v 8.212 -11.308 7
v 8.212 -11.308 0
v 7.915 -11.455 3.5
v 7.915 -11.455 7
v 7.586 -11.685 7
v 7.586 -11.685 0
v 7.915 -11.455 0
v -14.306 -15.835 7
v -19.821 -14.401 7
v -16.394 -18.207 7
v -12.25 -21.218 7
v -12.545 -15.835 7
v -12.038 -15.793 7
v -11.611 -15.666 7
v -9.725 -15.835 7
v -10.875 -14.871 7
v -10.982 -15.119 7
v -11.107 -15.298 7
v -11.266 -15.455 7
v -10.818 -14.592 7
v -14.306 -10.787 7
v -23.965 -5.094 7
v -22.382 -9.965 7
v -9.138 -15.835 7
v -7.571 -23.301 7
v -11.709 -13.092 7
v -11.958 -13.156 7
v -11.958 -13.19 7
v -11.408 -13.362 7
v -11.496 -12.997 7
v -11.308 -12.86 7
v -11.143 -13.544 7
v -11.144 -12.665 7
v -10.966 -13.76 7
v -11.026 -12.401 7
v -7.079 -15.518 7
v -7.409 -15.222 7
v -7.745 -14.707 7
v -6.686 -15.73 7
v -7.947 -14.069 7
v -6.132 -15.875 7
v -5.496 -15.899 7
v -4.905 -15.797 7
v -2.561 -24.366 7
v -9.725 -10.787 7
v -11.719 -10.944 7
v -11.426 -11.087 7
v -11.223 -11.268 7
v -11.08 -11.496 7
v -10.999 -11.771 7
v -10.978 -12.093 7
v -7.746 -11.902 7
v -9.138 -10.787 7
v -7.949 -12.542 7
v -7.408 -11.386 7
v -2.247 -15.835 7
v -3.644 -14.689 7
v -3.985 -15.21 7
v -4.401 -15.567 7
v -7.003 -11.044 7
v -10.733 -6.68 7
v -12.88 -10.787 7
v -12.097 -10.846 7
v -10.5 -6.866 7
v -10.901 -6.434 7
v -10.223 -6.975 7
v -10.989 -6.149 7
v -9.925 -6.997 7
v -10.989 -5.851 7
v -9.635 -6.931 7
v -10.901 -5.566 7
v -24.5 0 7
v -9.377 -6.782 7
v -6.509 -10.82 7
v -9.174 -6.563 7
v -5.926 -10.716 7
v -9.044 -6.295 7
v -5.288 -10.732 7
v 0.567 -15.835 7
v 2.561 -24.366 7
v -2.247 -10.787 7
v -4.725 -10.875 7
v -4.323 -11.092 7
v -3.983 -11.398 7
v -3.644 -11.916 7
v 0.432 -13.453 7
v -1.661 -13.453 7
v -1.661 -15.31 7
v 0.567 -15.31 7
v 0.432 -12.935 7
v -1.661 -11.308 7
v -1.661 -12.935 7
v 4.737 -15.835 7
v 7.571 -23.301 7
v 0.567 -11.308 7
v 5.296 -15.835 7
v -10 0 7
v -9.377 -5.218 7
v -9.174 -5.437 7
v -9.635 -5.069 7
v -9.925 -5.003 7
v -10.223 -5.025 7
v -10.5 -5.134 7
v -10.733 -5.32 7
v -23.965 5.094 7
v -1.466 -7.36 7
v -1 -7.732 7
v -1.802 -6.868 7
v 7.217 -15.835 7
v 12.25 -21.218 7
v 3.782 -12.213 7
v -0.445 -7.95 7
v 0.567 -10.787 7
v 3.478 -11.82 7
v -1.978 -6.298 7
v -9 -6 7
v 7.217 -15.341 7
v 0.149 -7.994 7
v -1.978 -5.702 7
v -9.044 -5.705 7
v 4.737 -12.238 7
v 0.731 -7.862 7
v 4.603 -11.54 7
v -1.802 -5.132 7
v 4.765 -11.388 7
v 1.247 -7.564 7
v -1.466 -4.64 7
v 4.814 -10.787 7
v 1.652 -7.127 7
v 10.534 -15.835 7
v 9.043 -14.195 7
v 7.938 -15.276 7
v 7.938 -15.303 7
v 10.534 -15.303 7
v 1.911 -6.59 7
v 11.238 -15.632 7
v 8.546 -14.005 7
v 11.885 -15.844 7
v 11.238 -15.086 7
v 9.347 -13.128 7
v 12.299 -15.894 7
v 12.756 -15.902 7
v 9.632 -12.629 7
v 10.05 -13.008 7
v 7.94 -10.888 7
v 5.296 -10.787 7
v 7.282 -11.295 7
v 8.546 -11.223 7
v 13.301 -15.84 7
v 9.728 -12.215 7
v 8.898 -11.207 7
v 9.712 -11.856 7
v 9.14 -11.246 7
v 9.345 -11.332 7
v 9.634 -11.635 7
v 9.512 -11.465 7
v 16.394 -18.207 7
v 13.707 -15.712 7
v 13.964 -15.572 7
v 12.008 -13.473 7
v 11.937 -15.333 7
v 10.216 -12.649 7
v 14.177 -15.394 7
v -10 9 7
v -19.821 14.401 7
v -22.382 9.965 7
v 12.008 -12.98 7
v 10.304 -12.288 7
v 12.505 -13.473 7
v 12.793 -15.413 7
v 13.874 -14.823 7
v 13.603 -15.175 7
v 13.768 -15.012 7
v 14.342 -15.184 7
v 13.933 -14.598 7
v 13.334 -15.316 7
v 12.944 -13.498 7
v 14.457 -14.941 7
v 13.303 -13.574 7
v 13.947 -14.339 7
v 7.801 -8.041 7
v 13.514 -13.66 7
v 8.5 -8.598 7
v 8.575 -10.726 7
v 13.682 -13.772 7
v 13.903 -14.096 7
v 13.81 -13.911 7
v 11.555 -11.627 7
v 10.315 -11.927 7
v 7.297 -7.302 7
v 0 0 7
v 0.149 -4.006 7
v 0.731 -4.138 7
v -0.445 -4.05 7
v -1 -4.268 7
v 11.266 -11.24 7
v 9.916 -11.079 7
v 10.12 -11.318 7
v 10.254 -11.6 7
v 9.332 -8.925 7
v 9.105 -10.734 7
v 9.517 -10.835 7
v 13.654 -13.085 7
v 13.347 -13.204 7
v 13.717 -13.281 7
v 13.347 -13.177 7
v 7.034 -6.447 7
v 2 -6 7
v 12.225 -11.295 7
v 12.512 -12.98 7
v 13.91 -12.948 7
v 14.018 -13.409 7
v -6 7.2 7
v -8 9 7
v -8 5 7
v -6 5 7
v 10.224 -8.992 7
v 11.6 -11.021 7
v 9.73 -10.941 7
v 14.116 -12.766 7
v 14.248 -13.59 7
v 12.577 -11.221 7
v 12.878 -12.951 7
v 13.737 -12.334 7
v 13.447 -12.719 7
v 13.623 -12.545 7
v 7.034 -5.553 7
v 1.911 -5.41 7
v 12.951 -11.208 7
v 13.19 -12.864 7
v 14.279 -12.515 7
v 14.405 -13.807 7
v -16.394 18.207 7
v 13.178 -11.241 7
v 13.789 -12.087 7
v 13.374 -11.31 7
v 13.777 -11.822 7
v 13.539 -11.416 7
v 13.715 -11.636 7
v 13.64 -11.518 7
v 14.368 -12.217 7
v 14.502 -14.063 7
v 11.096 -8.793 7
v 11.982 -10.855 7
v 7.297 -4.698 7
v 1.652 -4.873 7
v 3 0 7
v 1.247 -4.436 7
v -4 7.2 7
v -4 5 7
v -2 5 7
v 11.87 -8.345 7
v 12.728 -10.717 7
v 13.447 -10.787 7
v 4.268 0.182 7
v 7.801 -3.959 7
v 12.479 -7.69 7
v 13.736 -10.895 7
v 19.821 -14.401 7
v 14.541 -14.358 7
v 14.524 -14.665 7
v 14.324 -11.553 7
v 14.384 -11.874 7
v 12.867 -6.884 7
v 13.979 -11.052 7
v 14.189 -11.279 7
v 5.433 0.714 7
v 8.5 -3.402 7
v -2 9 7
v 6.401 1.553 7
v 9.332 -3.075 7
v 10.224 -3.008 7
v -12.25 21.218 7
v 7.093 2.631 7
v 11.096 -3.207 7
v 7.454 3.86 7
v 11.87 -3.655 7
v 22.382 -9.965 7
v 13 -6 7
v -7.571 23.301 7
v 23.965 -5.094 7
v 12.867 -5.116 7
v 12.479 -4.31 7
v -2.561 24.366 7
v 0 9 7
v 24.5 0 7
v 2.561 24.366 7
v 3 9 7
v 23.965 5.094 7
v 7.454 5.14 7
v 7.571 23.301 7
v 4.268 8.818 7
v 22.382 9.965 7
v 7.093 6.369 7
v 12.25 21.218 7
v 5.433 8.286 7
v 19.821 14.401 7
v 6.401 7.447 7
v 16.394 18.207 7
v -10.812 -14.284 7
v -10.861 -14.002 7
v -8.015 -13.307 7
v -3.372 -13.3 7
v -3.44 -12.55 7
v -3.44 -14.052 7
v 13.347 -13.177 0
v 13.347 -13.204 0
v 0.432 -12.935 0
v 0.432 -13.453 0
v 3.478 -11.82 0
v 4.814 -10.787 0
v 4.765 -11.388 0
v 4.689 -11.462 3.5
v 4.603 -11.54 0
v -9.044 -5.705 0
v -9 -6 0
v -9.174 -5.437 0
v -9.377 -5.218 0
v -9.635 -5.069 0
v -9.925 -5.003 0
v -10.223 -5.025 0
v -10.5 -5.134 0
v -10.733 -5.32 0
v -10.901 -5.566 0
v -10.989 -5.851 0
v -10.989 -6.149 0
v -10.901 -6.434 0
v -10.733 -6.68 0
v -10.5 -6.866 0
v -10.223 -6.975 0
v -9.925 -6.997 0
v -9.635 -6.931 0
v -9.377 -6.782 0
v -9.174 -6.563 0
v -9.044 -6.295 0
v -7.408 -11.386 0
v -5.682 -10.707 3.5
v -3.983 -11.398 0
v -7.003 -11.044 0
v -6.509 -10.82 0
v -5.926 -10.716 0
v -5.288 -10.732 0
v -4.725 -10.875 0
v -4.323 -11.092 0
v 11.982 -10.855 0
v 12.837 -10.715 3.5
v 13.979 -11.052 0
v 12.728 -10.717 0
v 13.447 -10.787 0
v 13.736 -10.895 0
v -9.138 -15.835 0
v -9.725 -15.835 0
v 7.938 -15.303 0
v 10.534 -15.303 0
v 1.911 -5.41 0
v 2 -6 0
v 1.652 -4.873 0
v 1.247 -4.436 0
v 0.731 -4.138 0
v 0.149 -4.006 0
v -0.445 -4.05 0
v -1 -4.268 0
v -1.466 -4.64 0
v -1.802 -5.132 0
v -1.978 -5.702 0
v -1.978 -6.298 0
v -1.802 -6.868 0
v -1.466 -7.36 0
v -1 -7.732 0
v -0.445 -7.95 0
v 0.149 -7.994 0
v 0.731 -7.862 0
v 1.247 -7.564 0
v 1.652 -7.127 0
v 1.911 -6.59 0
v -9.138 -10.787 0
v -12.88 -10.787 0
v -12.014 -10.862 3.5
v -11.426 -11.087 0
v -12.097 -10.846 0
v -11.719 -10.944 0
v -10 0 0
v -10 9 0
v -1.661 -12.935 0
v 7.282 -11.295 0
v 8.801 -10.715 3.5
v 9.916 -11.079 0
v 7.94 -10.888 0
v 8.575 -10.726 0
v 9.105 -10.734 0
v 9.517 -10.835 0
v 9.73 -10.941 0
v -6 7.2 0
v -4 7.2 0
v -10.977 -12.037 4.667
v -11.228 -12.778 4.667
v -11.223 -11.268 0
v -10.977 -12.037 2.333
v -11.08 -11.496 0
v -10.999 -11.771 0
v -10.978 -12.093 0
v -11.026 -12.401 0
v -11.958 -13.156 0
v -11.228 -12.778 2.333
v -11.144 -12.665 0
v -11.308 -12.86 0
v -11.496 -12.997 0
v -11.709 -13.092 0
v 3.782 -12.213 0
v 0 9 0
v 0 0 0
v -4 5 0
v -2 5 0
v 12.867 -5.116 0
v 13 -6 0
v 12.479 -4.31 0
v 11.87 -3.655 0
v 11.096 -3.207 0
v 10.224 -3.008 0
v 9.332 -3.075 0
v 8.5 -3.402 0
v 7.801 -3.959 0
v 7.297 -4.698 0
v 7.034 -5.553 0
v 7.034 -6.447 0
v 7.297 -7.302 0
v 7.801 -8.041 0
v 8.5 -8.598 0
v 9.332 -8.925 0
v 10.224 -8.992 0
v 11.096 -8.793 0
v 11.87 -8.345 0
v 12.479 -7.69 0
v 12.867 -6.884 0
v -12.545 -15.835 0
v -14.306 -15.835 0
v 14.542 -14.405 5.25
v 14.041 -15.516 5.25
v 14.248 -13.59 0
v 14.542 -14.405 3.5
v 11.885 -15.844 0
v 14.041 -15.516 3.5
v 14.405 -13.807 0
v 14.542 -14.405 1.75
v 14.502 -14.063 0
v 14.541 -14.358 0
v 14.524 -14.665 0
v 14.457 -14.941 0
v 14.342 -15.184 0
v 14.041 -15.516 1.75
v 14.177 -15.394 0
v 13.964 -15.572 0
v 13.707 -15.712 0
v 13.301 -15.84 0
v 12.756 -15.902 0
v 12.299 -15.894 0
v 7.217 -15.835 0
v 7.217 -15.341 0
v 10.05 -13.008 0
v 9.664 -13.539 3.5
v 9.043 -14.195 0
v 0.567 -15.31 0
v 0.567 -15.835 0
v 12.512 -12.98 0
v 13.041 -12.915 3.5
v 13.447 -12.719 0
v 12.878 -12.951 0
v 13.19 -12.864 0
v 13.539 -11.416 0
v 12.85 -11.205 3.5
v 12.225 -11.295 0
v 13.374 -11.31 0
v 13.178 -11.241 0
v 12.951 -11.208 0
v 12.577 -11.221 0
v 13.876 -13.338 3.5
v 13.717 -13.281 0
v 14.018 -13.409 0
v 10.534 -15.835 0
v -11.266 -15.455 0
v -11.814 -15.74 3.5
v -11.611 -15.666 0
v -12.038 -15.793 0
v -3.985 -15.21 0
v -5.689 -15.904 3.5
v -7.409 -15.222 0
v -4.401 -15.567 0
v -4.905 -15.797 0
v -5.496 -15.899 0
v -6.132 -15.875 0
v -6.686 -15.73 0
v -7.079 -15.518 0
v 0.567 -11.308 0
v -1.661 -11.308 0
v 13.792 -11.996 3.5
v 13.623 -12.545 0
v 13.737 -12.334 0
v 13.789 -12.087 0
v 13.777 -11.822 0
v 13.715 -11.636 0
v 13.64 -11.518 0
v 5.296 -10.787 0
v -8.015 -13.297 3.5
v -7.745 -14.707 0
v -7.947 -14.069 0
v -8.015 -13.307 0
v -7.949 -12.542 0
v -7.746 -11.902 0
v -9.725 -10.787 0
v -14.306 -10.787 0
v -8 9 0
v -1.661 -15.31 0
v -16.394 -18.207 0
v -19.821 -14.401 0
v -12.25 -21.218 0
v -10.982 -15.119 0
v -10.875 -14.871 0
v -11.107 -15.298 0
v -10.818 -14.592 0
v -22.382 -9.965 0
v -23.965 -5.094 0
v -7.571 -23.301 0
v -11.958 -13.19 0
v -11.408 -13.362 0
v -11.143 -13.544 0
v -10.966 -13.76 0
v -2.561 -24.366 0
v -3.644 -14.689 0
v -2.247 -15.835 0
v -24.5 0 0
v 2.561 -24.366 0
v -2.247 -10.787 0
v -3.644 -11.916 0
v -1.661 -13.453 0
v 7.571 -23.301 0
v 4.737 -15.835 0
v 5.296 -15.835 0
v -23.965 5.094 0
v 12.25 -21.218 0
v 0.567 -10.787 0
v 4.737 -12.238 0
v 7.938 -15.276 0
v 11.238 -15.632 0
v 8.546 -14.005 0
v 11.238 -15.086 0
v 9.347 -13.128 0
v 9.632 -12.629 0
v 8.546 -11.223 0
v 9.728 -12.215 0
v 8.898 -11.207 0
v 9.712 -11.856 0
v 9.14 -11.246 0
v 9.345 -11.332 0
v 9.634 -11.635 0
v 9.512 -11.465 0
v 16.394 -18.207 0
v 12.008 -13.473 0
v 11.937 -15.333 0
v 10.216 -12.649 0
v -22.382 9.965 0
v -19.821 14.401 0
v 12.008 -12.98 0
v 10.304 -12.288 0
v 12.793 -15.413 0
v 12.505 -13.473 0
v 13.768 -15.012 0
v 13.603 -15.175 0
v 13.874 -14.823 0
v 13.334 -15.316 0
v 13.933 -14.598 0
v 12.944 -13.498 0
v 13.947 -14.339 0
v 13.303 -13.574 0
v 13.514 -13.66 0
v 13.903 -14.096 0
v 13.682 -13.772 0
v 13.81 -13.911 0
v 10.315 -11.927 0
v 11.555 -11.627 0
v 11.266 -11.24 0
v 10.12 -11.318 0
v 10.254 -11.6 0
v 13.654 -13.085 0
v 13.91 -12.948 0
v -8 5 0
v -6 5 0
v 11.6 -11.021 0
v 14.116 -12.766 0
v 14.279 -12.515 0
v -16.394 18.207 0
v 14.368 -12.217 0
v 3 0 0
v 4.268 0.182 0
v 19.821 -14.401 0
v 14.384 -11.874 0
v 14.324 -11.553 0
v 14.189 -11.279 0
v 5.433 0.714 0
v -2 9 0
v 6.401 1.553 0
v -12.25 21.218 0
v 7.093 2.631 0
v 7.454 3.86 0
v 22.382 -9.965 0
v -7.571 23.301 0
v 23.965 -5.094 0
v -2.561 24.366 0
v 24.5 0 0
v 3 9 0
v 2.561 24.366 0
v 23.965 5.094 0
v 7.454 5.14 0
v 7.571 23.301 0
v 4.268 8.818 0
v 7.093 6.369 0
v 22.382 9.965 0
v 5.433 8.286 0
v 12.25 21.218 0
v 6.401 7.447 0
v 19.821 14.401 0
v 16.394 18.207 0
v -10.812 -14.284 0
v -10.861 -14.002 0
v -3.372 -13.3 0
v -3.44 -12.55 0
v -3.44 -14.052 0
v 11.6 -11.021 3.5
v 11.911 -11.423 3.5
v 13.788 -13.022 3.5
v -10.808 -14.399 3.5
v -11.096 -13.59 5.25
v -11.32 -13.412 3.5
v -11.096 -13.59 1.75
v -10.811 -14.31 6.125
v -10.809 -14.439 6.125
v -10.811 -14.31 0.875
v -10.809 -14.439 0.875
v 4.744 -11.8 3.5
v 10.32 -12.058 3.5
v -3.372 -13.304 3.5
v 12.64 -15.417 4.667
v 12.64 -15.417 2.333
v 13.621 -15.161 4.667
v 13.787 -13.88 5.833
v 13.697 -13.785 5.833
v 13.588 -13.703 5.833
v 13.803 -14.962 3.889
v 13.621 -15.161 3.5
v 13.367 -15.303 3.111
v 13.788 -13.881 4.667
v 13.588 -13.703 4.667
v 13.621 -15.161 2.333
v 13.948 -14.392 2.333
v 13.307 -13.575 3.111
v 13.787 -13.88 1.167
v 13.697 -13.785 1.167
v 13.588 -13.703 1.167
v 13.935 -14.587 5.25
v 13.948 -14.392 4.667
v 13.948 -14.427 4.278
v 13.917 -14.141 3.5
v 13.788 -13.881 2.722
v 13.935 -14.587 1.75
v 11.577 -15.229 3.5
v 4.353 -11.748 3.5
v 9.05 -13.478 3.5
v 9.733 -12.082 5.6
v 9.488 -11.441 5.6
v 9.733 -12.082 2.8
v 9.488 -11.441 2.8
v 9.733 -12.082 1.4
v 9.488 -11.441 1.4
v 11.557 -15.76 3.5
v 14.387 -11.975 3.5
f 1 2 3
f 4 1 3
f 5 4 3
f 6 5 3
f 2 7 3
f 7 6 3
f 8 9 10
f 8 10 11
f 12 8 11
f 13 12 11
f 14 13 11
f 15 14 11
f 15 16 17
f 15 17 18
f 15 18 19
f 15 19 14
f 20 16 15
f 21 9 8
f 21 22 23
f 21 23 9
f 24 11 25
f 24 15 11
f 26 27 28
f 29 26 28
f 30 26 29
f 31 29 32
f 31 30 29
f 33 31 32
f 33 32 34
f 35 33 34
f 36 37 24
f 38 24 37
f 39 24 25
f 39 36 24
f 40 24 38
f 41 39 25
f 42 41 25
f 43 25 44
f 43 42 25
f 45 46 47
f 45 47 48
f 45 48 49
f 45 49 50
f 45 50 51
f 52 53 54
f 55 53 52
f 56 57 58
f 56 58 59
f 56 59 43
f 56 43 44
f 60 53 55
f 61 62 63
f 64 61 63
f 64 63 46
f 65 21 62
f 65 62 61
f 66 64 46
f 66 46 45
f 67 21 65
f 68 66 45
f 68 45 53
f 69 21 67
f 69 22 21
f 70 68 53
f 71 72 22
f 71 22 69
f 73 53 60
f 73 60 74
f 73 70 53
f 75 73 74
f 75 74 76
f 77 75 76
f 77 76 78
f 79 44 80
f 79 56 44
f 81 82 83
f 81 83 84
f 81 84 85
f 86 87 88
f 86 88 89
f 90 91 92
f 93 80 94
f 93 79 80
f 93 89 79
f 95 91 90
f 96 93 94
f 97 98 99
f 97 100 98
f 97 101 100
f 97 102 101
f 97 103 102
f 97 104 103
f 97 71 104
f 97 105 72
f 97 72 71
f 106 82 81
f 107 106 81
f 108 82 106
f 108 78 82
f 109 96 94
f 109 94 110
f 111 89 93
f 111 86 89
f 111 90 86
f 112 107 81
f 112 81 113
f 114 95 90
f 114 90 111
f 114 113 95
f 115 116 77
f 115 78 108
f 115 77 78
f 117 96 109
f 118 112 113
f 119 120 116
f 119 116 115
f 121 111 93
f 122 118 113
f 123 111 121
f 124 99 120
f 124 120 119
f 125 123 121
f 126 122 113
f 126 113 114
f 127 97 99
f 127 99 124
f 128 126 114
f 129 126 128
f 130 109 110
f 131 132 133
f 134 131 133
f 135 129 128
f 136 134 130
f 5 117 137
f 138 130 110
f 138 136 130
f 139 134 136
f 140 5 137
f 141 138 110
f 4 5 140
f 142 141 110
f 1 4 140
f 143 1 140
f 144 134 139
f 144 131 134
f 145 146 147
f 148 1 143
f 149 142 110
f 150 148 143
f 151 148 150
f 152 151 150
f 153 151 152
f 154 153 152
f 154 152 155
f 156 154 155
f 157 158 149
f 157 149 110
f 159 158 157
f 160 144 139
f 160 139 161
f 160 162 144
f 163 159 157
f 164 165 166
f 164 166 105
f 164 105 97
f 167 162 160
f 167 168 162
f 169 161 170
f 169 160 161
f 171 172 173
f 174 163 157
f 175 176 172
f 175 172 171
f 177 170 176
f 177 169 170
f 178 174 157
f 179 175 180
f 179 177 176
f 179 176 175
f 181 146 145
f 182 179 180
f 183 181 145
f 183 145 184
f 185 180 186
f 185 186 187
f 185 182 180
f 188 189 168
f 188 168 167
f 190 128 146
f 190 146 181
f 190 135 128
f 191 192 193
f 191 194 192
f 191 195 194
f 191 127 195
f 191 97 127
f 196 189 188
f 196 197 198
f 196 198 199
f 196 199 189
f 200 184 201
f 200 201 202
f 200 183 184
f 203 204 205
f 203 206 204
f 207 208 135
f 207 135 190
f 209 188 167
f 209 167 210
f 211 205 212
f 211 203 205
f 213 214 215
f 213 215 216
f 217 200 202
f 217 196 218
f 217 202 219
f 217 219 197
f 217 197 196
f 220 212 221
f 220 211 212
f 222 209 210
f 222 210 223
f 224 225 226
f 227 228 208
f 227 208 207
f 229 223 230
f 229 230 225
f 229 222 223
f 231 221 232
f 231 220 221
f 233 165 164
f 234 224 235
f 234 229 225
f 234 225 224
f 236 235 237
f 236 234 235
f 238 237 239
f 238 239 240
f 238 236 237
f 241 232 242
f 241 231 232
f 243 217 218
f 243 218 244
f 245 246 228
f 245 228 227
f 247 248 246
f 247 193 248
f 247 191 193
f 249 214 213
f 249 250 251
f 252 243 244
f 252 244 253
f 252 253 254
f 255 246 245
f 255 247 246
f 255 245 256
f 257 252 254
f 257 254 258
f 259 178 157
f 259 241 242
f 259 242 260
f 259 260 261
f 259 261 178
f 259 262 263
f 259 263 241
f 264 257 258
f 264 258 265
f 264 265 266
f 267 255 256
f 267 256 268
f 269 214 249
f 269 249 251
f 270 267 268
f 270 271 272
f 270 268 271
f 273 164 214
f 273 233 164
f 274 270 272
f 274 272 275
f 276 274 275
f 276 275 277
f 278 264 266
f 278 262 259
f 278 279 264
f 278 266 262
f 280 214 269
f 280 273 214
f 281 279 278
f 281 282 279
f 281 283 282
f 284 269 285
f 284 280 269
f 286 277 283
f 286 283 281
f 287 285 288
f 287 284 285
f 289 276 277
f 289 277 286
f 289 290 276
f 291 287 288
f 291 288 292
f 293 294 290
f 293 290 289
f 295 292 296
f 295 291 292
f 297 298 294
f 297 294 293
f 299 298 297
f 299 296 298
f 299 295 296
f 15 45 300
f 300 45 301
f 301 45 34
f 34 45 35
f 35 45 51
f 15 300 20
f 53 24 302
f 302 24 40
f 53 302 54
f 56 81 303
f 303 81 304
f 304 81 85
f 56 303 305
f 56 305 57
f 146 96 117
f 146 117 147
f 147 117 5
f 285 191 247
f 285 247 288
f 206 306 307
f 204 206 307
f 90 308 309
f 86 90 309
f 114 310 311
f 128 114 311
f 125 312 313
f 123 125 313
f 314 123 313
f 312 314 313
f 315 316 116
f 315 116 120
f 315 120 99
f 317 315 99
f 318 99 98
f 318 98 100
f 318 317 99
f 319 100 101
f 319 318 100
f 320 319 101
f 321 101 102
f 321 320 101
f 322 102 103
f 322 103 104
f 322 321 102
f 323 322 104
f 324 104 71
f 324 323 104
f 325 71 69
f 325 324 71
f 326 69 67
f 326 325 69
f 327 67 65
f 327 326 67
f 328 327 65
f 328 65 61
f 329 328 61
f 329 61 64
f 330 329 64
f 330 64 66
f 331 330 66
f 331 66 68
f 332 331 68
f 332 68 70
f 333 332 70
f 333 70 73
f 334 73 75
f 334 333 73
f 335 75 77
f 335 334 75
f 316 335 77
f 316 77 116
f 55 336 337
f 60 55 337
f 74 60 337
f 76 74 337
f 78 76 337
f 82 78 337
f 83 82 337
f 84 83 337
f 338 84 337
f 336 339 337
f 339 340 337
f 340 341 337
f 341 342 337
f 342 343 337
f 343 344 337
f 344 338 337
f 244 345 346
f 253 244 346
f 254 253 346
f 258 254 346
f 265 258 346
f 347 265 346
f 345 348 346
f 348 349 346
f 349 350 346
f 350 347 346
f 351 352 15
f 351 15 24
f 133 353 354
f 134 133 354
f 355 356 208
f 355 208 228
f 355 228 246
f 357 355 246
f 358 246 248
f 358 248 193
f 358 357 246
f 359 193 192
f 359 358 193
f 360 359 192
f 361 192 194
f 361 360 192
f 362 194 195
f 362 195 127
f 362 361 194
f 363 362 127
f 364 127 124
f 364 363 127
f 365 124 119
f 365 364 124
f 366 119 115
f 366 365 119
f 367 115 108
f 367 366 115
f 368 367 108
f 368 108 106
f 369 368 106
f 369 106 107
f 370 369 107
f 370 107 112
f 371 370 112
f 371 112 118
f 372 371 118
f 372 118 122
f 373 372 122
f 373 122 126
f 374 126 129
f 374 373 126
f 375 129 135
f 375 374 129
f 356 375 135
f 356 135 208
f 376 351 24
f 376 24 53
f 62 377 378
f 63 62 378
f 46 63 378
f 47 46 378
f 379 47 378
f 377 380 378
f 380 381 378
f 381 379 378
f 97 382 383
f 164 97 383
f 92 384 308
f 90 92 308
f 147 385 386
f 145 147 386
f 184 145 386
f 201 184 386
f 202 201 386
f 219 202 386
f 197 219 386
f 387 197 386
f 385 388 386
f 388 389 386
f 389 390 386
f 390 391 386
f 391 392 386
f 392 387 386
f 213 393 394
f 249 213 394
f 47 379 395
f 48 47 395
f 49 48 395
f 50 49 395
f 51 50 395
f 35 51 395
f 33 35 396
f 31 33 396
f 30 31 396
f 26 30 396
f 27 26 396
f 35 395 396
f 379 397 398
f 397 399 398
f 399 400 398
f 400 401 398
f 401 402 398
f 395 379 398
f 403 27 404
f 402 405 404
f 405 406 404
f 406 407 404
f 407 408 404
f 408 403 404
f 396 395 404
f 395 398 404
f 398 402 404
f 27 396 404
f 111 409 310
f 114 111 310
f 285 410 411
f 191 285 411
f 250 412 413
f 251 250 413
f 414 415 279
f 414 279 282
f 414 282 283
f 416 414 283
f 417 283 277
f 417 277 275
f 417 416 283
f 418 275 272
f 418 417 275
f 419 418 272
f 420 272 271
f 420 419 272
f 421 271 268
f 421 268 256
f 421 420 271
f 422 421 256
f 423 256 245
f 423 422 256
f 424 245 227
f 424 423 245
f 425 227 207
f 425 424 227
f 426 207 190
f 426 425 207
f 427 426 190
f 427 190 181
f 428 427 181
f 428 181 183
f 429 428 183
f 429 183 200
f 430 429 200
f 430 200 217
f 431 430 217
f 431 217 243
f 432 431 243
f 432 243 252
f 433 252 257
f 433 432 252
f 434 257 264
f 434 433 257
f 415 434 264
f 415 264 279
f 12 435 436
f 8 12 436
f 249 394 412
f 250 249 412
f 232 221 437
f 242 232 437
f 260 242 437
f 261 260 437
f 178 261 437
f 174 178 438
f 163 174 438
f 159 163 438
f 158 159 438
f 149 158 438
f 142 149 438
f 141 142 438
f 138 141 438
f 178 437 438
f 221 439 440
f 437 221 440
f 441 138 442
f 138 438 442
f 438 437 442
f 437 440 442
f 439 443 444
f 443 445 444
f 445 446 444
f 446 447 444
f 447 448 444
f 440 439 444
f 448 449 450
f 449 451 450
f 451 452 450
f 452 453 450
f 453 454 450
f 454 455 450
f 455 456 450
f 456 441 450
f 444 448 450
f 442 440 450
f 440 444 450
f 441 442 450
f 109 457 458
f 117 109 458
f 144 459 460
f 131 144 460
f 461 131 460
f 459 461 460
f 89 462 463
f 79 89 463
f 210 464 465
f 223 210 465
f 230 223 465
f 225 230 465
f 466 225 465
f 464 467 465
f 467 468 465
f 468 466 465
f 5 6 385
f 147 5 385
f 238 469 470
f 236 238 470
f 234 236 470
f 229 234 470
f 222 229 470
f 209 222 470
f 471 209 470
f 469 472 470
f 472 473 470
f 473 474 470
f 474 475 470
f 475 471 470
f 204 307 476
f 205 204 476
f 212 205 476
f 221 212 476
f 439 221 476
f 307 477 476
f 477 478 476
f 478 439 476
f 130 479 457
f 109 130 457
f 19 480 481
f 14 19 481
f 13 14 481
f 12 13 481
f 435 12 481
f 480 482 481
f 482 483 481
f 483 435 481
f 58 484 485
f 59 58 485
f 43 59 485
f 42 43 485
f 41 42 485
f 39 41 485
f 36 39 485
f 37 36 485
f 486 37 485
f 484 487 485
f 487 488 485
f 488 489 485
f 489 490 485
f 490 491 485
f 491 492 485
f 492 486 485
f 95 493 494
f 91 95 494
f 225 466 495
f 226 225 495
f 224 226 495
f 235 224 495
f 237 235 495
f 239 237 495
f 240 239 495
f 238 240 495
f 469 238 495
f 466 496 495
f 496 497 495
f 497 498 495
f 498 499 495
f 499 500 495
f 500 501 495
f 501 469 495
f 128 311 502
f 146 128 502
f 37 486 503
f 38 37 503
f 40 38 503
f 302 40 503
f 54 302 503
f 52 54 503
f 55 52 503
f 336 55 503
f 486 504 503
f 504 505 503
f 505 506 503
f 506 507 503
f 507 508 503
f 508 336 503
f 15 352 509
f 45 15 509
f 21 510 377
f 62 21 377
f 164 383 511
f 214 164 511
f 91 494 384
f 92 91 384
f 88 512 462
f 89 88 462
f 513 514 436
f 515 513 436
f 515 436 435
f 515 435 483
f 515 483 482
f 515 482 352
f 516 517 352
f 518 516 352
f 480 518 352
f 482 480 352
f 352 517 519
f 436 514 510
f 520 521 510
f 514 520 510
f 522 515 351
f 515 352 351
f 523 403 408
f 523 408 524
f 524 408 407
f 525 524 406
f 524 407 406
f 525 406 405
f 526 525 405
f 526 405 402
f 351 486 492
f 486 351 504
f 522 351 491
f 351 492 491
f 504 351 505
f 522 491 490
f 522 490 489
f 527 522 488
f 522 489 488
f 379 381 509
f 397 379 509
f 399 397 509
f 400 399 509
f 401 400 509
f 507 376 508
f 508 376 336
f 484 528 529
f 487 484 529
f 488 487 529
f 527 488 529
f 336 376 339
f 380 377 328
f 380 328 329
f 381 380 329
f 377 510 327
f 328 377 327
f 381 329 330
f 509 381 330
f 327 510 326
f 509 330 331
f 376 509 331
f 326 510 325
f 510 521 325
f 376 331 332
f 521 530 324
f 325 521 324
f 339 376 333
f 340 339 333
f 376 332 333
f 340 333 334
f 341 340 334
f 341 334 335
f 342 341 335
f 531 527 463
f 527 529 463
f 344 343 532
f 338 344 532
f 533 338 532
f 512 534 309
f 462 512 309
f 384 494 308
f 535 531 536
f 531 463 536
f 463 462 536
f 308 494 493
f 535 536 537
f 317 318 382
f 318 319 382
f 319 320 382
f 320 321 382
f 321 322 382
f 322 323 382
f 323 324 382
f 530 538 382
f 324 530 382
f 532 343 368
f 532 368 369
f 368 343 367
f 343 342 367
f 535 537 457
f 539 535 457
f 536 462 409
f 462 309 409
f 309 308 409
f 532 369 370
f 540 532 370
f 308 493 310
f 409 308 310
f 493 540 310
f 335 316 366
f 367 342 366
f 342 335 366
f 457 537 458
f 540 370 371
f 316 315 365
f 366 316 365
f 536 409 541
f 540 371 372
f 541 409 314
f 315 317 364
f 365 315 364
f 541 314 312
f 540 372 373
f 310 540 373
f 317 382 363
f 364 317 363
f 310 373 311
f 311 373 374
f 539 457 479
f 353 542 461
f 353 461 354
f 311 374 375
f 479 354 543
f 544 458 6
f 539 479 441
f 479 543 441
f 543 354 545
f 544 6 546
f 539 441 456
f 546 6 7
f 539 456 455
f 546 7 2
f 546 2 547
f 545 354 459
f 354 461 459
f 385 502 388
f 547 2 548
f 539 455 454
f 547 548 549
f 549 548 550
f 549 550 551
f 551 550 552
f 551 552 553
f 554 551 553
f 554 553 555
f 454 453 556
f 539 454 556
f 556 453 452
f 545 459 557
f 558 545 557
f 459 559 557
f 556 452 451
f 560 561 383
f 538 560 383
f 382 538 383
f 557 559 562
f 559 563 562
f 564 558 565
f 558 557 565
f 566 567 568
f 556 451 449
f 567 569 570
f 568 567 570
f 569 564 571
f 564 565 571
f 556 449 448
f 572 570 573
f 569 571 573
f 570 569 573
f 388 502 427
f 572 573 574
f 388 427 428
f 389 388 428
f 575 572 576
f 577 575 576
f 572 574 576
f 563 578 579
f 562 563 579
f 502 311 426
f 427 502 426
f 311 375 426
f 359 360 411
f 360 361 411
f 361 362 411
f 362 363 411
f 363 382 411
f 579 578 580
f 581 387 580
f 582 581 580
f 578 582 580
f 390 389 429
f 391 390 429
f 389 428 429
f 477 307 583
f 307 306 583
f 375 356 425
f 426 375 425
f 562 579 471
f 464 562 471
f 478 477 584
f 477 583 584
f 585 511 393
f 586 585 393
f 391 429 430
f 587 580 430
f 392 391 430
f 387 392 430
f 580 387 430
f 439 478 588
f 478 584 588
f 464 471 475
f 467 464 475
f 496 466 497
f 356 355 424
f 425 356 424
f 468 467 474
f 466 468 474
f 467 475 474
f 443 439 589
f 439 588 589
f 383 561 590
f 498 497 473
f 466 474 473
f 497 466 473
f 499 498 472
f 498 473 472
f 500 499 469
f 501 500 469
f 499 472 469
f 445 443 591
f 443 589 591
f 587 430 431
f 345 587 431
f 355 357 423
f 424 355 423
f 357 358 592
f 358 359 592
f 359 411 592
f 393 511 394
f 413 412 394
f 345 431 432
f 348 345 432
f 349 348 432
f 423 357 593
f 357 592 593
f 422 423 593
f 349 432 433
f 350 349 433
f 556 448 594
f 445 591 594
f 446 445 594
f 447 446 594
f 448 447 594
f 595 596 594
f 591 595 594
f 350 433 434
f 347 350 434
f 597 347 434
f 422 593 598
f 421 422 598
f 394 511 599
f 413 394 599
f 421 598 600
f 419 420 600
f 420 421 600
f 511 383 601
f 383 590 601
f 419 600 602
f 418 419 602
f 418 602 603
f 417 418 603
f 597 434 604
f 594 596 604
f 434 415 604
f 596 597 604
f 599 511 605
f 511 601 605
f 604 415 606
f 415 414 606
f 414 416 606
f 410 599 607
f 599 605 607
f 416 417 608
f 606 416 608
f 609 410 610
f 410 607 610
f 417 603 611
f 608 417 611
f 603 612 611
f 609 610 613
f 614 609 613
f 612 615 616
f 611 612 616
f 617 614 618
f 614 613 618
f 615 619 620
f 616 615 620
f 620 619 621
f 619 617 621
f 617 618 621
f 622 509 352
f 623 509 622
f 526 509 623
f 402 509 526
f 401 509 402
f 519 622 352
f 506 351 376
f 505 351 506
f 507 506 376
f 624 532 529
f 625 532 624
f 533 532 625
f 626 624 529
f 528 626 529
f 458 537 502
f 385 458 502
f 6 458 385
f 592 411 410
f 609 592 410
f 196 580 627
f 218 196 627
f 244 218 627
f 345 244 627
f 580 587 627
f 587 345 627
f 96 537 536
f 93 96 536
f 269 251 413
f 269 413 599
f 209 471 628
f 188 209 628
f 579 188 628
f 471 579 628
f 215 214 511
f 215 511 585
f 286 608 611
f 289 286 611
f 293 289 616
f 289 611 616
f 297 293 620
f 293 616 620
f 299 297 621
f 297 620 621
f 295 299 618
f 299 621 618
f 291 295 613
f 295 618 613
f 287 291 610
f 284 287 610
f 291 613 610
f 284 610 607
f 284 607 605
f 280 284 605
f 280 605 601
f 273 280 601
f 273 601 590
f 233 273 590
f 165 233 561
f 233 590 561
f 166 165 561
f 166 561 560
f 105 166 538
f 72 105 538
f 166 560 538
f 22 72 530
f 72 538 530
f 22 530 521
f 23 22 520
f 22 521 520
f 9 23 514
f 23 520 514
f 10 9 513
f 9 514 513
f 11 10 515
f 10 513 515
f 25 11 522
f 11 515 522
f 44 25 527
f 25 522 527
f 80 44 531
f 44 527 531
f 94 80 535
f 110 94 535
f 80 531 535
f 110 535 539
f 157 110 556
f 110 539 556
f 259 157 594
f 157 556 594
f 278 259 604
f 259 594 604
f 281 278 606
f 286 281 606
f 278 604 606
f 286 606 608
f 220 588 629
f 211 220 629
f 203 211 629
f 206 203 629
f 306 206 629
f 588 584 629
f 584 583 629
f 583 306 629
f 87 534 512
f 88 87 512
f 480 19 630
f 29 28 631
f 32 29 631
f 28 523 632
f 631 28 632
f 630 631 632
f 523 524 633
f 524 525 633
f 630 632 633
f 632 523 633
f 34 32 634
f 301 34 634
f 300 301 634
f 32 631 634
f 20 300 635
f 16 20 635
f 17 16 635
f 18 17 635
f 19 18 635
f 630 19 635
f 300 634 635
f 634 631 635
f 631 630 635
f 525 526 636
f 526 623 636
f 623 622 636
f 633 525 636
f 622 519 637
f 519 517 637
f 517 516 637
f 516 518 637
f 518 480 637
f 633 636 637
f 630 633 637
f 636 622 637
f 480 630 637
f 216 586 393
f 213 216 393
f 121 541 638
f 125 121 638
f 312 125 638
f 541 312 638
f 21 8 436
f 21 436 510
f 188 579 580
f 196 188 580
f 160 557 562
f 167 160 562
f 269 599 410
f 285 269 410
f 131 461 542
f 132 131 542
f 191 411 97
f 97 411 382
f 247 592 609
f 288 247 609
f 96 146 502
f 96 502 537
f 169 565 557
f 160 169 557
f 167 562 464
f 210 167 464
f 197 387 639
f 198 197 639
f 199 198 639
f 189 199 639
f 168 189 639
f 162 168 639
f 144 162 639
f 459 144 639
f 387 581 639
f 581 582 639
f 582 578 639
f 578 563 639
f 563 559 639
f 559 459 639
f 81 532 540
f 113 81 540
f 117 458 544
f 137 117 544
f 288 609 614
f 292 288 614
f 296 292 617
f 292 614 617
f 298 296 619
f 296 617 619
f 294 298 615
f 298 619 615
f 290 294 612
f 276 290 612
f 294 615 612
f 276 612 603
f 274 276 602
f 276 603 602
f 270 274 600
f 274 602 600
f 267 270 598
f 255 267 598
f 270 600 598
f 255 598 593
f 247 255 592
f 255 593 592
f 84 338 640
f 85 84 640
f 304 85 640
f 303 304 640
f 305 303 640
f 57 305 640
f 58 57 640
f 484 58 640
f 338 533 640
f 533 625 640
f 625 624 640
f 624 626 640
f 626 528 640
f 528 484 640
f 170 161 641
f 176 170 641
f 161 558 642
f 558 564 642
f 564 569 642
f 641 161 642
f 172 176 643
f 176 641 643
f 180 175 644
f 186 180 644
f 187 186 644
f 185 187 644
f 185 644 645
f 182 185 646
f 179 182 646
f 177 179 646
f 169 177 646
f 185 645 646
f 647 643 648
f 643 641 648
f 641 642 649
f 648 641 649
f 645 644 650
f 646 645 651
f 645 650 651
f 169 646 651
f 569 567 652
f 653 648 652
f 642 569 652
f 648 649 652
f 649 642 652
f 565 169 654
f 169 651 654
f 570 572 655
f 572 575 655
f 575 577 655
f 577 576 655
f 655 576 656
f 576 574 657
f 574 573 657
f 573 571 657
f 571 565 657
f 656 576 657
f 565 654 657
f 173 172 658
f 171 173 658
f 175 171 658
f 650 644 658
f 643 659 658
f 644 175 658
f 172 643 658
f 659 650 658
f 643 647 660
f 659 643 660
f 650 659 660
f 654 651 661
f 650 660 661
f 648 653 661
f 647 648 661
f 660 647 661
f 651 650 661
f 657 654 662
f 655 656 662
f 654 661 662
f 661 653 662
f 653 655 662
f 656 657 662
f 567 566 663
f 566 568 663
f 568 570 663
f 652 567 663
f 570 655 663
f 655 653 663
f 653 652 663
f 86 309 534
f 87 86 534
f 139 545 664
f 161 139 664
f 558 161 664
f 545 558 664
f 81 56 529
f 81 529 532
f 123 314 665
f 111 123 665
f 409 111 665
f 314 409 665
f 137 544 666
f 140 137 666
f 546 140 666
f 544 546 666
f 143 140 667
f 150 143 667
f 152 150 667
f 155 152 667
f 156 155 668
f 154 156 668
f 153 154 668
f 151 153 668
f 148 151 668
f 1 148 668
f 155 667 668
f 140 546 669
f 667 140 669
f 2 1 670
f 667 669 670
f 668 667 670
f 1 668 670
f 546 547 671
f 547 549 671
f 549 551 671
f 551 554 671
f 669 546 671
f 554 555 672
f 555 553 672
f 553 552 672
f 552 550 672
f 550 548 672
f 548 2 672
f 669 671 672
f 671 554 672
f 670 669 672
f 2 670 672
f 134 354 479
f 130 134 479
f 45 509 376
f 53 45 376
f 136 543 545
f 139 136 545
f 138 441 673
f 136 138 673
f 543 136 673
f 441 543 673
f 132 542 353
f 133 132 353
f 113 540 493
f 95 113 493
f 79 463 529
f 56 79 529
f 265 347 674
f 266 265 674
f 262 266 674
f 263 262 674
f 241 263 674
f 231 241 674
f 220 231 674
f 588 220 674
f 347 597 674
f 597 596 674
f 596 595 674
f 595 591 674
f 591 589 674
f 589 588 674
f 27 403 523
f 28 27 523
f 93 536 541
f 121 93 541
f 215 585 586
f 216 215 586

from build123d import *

# Parameters (mm, degrees)
F0_R     = 24.5
F0_W     = 0.5866539
F0_H     = 5.0478750829
F0_R_2   = 1
F0_R_3   = 2
F0_R_4   = 3
F1_DEPTH = 7


with BuildPart() as f1:
    # F0 (on Top) → F1 (new body)
    with BuildSketch(Plane.XY):
        Circle(F0_R)
        with BuildLine():
            Line((-14.3061795684, -15.8348518479), (-14.3061795684, -10.786976765))
            Line((-14.3061795684, -10.786976765), (-12.879870369, -10.786976765))
            add(Edge.make_bspline(
                [(-12.879870369, -10.786976765), (-11.8755984385, -10.786976765), (-11.4264933343, -11.0874849775)],
                knots=[0, 0, 0, 1, 1, 1], degree=2))
            add(Edge.make_bspline(
                [(-11.4264933343, -11.0874849775), (-10.9773882301, -11.3879931899), (-10.9773882301, -12.0365164277)],
                knots=[0, 0, 0, 1, 1, 1], degree=2))
            add(Edge.make_bspline(
                [(-10.9773882301, -12.0365164277), (-10.9773882301, -12.4861739367), (-11.2276276055, -12.7778436723)],
                knots=[0, 0, 0, 1, 1, 1], degree=2))
            add(Edge.make_bspline(
                [(-11.2276276055, -12.7778436723), (-11.4778669809, -13.0695134079), (-11.9584591589, -13.155688557)],
                knots=[0, 0, 0, 1, 1, 1], degree=2))
            Line((-11.9584591589, -13.155688557), (-11.9584591589, -13.1899376548))
            add(Edge.make_bspline(
                [(-11.9584591589, -13.1899376548), (-10.8083523606, -13.3865937644), (-10.8083523606, -14.3985993621)],
                knots=[0, 0, 0, 1, 1, 1], degree=2))
            add(Edge.make_bspline(
                [(-10.8083523606, -14.3985993621), (-10.8083523606, -15.07474284), (-11.2657435369, -15.454797344)],
                knots=[0, 0, 0, 1, 1, 1], degree=2))
            add(Edge.make_bspline(
                [(-11.2657435369, -15.454797344), (-11.7231347131, -15.8348518479), (-12.5451130588, -15.8348518479)],
                knots=[0, 0, 0, 1, 1, 1], degree=2))
            Line((-12.5451130588, -15.8348518479), (-14.3061795684, -15.8348518479))
        make_face(mode=Mode.SUBTRACT)
        with Locations((-9.4312071886, -13.3109143065)):
            Rectangle(F0_W, F0_H, mode=Mode.SUBTRACT)
        with BuildLine():
            add(Edge.make_bspline(
                [(-3.9828386241, -11.3979364763), (-3.3718789129, -12.0884424791), (-3.3718789129, -13.303733044)],
                knots=[0, 0, 0, 1, 1, 1], degree=2))
            add(Edge.make_bspline(
                [(-3.3718789129, -13.303733044), (-3.3718789129, -14.5157091802), (-3.9850482434, -15.2100820166)],
                knots=[0, 0, 0, 1, 1, 1], degree=2))
            add(Edge.make_bspline(
                [(-3.9850482434, -15.2100820166), (-4.5982175738, -15.904454853), (-5.6886646535, -15.904454853)],
                knots=[0, 0, 0, 1, 1, 1], degree=2))
            add(Edge.make_bspline(
                [(-5.6886646535, -15.904454853), (-6.8034175444, -15.904454853), (-7.4094056124, -15.2222349222)],
                knots=[0, 0, 0, 1, 1, 1], degree=2))
            add(Edge.make_bspline(
                [(-7.4094056124, -15.2222349222), (-8.0153936805, -14.5400149915), (-8.0153936805, -13.2971041864)],
                knots=[0, 0, 0, 1, 1, 1], degree=2))
            add(Edge.make_bspline(
                [(-8.0153936805, -13.2971041864), (-8.0153936805, -12.0641366678), (-7.407748398, -11.3857835707)],
                knots=[0, 0, 0, 1, 1, 1], degree=2))
            add(Edge.make_bspline(
                [(-7.407748398, -11.3857835707), (-6.8001031156, -10.7074304735), (-5.6820357958, -10.7074304735)],
                knots=[0, 0, 0, 1, 1, 1], degree=2))
            add(Edge.make_bspline(
                [(-5.6820357958, -10.7074304735), (-4.5937983354, -10.7074304735), (-3.9828386241, -11.3979364763)],
                knots=[0, 0, 0, 1, 1, 1], degree=2))
        make_face(mode=Mode.SUBTRACT)
        Polygon((0.5667673271, -15.3100672858), (0.5667673271, -15.8348518479), (-2.2471827355, -15.8348518479), (-2.2471827355, -10.786976765), (0.5667673271, -10.786976765), (0.5667673271, -11.3084468984), (-1.6605288355, -11.3084468984), (-1.6605288355, -12.9347266362), (0.4319805554, -12.9347266362), (0.4319805554, -13.4528823407), (-1.6605288355, -13.4528823407), (-1.6605288355, -15.3100672858), align=None, mode=Mode.SUBTRACT)
        with Locations((-10, -6)):
            Circle(F0_R_2, mode=Mode.SUBTRACT)
        with Locations((0, -6)):
            Circle(F0_R_3, mode=Mode.SUBTRACT)
        with BuildLine():
            Line((5.2964572439, -10.786976765), (5.2964572439, -15.8348518479))
            Line((5.2964572439, -15.8348518479), (4.737423584, -15.8348518479))
            Line((4.737423584, -15.8348518479), (4.737423584, -12.2375917757))
            add(Edge.make_bspline(
                [(4.737423584, -12.2375917757), (4.737423584, -11.7879342667), (4.7650438241, -11.3879931899)],
                knots=[0, 0, 0, 1, 1, 1], degree=2))
            add(Edge.make_bspline(
                [(4.7650438241, -11.3879931899), (4.6932311998, -11.4609106238), (4.6031892171, -11.5399045105)],
                knots=[0, 0, 0, 1, 1, 1], degree=2))
            add(Edge.make_bspline(
                [(4.6031892171, -11.5399045105), (4.5131472343, -11.6188983972), (3.7817632761, -12.2132859644)],
                knots=[0, 0, 0, 1, 1, 1], degree=2))
            Line((3.7817632761, -12.2132859644), (3.4779406349, -11.8199737452))
            Line((3.4779406349, -11.8199737452), (4.8136554467, -10.786976765))
            Line((4.8136554467, -10.786976765), (5.2964572439, -10.786976765))
        make_face(mode=Mode.SUBTRACT)
        with BuildLine():
            Line((10.5343595787, -15.3034384282), (10.5343595787, -15.8348518479))
            Line((10.5343595787, -15.8348518479), (7.2166163365, -15.8348518479))
            Line((7.2166163365, -15.8348518479), (7.2166163365, -15.3410019547))
            Line((7.2166163365, -15.3410019547), (8.5457022906, -14.0052871429))
            add(Edge.make_bspline(
                [(8.5457022906, -14.0052871429), (9.1533475731, -13.3899081932), (9.3466892539, -13.1275159121)],
                knots=[0, 0, 0, 1, 1, 1], degree=2))
            add(Edge.make_bspline(
                [(9.3466892539, -13.1275159121), (9.5400309347, -12.8651236311), (9.6367017751, -12.6165414701)],
                knots=[0, 0, 0, 1, 1, 1], degree=2))
            add(Edge.make_bspline(
                [(9.6367017751, -12.6165414701), (9.7333726155, -12.3679593091), (9.7333726155, -12.0818136215)],
                knots=[0, 0, 0, 1, 1, 1], degree=2))
            add(Edge.make_bspline(
                [(9.7333726155, -12.0818136215), (9.7333726155, -11.6774533063), (9.4881048833, -11.4410240509)],
                knots=[0, 0, 0, 1, 1, 1], degree=2))
            add(Edge.make_bspline(
                [(9.4881048833, -11.4410240509), (9.2428371511, -11.2045947955), (8.8075421669, -11.2045947955)],
                knots=[0, 0, 0, 1, 1, 1], degree=2))
            add(Edge.make_bspline(
                [(8.8075421669, -11.2045947955), (8.4937762392, -11.2045947955), (8.2120497901, -11.3084468984)],
                knots=[0, 0, 0, 1, 1, 1], degree=2))
            add(Edge.make_bspline(
                [(8.2120497901, -11.3084468984), (7.9303233409, -11.4122990012), (7.5856227443, -11.6851869735)],
                knots=[0, 0, 0, 1, 1, 1], degree=2))
            Line((7.5856227443, -11.6851869735), (7.2818001031, -11.2951891831))
            add(Edge.make_bspline(
                [(7.2818001031, -11.2951891831), (7.9789349635, -10.7151641408), (8.8009133093, -10.7151641408)],
                knots=[0, 0, 0, 1, 1, 1], degree=2))
            add(Edge.make_bspline(
                [(8.8009133093, -10.7151641408), (9.5124106946, -10.7151641408), (9.916218605, -11.0791989054)],
                knots=[0, 0, 0, 1, 1, 1], degree=2))
            add(Edge.make_bspline(
                [(9.916218605, -11.0791989054), (10.3200265154, -11.4432336701), (10.3200265154, -12.0575078102)],
                knots=[0, 0, 0, 1, 1, 1], degree=2))
            add(Edge.make_bspline(
                [(10.3200265154, -12.0575078102), (10.3200265154, -12.5380999881), (10.0504529719, -13.00764407)],
                knots=[0, 0, 0, 1, 1, 1], degree=2))
            add(Edge.make_bspline(
                [(10.0504529719, -13.00764407), (9.7808794284, -13.477188152), (9.0428666127, -14.1953143949)],
                knots=[0, 0, 0, 1, 1, 1], degree=2))
            Line((9.0428666127, -14.1953143949), (7.9380570082, -15.275818188))
            Line((7.9380570082, -15.275818188), (7.9380570082, -15.3034384282))
            Line((7.9380570082, -15.3034384282), (10.5343595787, -15.3034384282))
        make_face(mode=Mode.SUBTRACT)
        with BuildLine():
            add(Edge.make_bspline(
                [(13.9791559255, -11.0515786653), (14.3868306695, -11.3879931899), (14.3868306695, -11.9746470899)],
                knots=[0, 0, 0, 1, 1, 1], degree=2))
            add(Edge.make_bspline(
                [(14.3868306695, -11.9746470899), (14.3868306695, -12.4585536966), (14.1155999116, -12.7656907667)],
                knots=[0, 0, 0, 1, 1, 1], degree=2))
            add(Edge.make_bspline(
                [(14.1155999116, -12.7656907667), (13.8443691537, -13.0728278367), (13.3472048317, -13.1766799395)],
                knots=[0, 0, 0, 1, 1, 1], degree=2))
            Line((13.3472048317, -13.1766799395), (13.3472048317, -13.2043001796))
            add(Edge.make_bspline(
                [(13.3472048317, -13.2043001796), (13.9548501142, -13.2794272327), (14.2481770642, -13.5904311364)],
                knots=[0, 0, 0, 1, 1, 1], degree=2))
            add(Edge.make_bspline(
                [(14.2481770642, -13.5904311364), (14.5415040141, -13.9014350401), (14.5415040141, -14.4052282197)],
                knots=[0, 0, 0, 1, 1, 1], degree=2))
            add(Edge.make_bspline(
                [(14.5415040141, -14.4052282197), (14.5415040141, -15.1266688914), (14.0410252633, -15.5155618722)],
                knots=[0, 0, 0, 1, 1, 1], degree=2))
            add(Edge.make_bspline(
                [(14.0410252633, -15.5155618722), (13.5405465125, -15.904454853), (12.6191353023, -15.904454853)],
                knots=[0, 0, 0, 1, 1, 1], degree=2))
            add(Edge.make_bspline(
                [(12.6191353023, -15.904454853), (12.2180894159, -15.904454853), (11.8849893202, -15.8436903247)],
                knots=[0, 0, 0, 1, 1, 1], degree=2))
            add(Edge.make_bspline(
                [(11.8849893202, -15.8436903247), (11.5518892244, -15.7829257965), (11.2381232968, -15.6315668807)],
                knots=[0, 0, 0, 1, 1, 1], degree=2))
            Line((11.2381232968, -15.6315668807), (11.2381232968, -15.0857909361))
            add(Edge.make_bspline(
                [(11.2381232968, -15.0857909361), (11.5662517493, -15.2481979479), (11.9374677764, -15.3327158827)],
                knots=[0, 0, 0, 1, 1, 1], degree=2))
            add(Edge.make_bspline(
                [(11.9374677764, -15.3327158827), (12.3086838035, -15.4172338174), (12.6401266848, -15.4172338174)],
                knots=[0, 0, 0, 1, 1, 1], degree=2))
            add(Edge.make_bspline(
                [(12.6401266848, -15.4172338174), (13.9482212565, -15.4172338174), (13.9482212565, -14.3919705045)],
                knots=[0, 0, 0, 1, 1, 1], degree=2))
            add(Edge.make_bspline(
                [(13.9482212565, -14.3919705045), (13.9482212565, -13.4727689135), (12.5053399131, -13.4727689135)],
                knots=[0, 0, 0, 1, 1, 1], degree=2))
            Line((12.5053399131, -13.4727689135), (12.0081755911, -13.4727689135))
            Line((12.0081755911, -13.4727689135), (12.0081755911, -12.9800238299))
            Line((12.0081755911, -12.9800238299), (12.5119687707, -12.9800238299))
            add(Edge.make_bspline(
                [(12.5119687707, -12.9800238299), (13.1019370995, -12.9800238299), (13.4471901009, -12.7192887633)],
                knots=[0, 0, 0, 1, 1, 1], degree=2))
            add(Edge.make_bspline(
                [(13.4471901009, -12.7192887633), (13.7924431023, -12.4585536966), (13.7924431023, -11.9956384723)],
                knots=[0, 0, 0, 1, 1, 1], degree=2))
            add(Edge.make_bspline(
                [(13.7924431023, -11.9956384723), (13.7924431023, -11.6266320645), (13.5388892981, -11.41561343)],
                knots=[0, 0, 0, 1, 1, 1], degree=2))
            add(Edge.make_bspline(
                [(13.5388892981, -11.41561343), (13.2853354938, -11.2045947955), (12.8500405097, -11.2045947955)],
                knots=[0, 0, 0, 1, 1, 1], degree=2))
            add(Edge.make_bspline(
                [(12.8500405097, -11.2045947955), (12.5185976283, -11.2045947955), (12.2252706784, -11.2946367783)],
                knots=[0, 0, 0, 1, 1, 1], degree=2))
            add(Edge.make_bspline(
                [(12.2252706784, -11.2946367783), (11.9319437284, -11.3846787611), (11.5552036532, -11.6266320645)],
                knots=[0, 0, 0, 1, 1, 1], degree=2))
            Line((11.5552036532, -11.6266320645), (11.2657435369, -11.2399487029))
            add(Edge.make_bspline(
                [(11.2657435369, -11.2399487029), (11.5761950357, -10.9946809707), (11.9816601606, -10.8549225557)],
                knots=[0, 0, 0, 1, 1, 1], degree=2))
            add(Edge.make_bspline(
                [(11.9816601606, -10.8549225557), (12.3871252854, -10.7151641408), (12.8367827944, -10.7151641408)],
                knots=[0, 0, 0, 1, 1, 1], degree=2))
            add(Edge.make_bspline(
                [(12.8367827944, -10.7151641408), (13.5714811814, -10.7151641408), (13.9791559255, -11.0515786653)],
                knots=[0, 0, 0, 1, 1, 1], degree=2))
        make_face(mode=Mode.SUBTRACT)
        with Locations((10, -6)):
            Circle(F0_R_4, mode=Mode.SUBTRACT)
        Polygon((0, 9), (0, 0), (-10, 0), (-10, 9), (-8, 9), (-8, 5), (-6, 5), (-6, 7.2), (-4, 7.2), (-4, 5), (-2, 5), (-2, 9), align=None, mode=Mode.SUBTRACT)
        with BuildLine():
            Line((3, 0), (3, 9))
            ThreePointArc((3, 9), (7.5, 4.5), (3, 0))
        make_face(mode=Mode.SUBTRACT)
    extrude(amount=F1_DEPTH)


solid = f1.part
